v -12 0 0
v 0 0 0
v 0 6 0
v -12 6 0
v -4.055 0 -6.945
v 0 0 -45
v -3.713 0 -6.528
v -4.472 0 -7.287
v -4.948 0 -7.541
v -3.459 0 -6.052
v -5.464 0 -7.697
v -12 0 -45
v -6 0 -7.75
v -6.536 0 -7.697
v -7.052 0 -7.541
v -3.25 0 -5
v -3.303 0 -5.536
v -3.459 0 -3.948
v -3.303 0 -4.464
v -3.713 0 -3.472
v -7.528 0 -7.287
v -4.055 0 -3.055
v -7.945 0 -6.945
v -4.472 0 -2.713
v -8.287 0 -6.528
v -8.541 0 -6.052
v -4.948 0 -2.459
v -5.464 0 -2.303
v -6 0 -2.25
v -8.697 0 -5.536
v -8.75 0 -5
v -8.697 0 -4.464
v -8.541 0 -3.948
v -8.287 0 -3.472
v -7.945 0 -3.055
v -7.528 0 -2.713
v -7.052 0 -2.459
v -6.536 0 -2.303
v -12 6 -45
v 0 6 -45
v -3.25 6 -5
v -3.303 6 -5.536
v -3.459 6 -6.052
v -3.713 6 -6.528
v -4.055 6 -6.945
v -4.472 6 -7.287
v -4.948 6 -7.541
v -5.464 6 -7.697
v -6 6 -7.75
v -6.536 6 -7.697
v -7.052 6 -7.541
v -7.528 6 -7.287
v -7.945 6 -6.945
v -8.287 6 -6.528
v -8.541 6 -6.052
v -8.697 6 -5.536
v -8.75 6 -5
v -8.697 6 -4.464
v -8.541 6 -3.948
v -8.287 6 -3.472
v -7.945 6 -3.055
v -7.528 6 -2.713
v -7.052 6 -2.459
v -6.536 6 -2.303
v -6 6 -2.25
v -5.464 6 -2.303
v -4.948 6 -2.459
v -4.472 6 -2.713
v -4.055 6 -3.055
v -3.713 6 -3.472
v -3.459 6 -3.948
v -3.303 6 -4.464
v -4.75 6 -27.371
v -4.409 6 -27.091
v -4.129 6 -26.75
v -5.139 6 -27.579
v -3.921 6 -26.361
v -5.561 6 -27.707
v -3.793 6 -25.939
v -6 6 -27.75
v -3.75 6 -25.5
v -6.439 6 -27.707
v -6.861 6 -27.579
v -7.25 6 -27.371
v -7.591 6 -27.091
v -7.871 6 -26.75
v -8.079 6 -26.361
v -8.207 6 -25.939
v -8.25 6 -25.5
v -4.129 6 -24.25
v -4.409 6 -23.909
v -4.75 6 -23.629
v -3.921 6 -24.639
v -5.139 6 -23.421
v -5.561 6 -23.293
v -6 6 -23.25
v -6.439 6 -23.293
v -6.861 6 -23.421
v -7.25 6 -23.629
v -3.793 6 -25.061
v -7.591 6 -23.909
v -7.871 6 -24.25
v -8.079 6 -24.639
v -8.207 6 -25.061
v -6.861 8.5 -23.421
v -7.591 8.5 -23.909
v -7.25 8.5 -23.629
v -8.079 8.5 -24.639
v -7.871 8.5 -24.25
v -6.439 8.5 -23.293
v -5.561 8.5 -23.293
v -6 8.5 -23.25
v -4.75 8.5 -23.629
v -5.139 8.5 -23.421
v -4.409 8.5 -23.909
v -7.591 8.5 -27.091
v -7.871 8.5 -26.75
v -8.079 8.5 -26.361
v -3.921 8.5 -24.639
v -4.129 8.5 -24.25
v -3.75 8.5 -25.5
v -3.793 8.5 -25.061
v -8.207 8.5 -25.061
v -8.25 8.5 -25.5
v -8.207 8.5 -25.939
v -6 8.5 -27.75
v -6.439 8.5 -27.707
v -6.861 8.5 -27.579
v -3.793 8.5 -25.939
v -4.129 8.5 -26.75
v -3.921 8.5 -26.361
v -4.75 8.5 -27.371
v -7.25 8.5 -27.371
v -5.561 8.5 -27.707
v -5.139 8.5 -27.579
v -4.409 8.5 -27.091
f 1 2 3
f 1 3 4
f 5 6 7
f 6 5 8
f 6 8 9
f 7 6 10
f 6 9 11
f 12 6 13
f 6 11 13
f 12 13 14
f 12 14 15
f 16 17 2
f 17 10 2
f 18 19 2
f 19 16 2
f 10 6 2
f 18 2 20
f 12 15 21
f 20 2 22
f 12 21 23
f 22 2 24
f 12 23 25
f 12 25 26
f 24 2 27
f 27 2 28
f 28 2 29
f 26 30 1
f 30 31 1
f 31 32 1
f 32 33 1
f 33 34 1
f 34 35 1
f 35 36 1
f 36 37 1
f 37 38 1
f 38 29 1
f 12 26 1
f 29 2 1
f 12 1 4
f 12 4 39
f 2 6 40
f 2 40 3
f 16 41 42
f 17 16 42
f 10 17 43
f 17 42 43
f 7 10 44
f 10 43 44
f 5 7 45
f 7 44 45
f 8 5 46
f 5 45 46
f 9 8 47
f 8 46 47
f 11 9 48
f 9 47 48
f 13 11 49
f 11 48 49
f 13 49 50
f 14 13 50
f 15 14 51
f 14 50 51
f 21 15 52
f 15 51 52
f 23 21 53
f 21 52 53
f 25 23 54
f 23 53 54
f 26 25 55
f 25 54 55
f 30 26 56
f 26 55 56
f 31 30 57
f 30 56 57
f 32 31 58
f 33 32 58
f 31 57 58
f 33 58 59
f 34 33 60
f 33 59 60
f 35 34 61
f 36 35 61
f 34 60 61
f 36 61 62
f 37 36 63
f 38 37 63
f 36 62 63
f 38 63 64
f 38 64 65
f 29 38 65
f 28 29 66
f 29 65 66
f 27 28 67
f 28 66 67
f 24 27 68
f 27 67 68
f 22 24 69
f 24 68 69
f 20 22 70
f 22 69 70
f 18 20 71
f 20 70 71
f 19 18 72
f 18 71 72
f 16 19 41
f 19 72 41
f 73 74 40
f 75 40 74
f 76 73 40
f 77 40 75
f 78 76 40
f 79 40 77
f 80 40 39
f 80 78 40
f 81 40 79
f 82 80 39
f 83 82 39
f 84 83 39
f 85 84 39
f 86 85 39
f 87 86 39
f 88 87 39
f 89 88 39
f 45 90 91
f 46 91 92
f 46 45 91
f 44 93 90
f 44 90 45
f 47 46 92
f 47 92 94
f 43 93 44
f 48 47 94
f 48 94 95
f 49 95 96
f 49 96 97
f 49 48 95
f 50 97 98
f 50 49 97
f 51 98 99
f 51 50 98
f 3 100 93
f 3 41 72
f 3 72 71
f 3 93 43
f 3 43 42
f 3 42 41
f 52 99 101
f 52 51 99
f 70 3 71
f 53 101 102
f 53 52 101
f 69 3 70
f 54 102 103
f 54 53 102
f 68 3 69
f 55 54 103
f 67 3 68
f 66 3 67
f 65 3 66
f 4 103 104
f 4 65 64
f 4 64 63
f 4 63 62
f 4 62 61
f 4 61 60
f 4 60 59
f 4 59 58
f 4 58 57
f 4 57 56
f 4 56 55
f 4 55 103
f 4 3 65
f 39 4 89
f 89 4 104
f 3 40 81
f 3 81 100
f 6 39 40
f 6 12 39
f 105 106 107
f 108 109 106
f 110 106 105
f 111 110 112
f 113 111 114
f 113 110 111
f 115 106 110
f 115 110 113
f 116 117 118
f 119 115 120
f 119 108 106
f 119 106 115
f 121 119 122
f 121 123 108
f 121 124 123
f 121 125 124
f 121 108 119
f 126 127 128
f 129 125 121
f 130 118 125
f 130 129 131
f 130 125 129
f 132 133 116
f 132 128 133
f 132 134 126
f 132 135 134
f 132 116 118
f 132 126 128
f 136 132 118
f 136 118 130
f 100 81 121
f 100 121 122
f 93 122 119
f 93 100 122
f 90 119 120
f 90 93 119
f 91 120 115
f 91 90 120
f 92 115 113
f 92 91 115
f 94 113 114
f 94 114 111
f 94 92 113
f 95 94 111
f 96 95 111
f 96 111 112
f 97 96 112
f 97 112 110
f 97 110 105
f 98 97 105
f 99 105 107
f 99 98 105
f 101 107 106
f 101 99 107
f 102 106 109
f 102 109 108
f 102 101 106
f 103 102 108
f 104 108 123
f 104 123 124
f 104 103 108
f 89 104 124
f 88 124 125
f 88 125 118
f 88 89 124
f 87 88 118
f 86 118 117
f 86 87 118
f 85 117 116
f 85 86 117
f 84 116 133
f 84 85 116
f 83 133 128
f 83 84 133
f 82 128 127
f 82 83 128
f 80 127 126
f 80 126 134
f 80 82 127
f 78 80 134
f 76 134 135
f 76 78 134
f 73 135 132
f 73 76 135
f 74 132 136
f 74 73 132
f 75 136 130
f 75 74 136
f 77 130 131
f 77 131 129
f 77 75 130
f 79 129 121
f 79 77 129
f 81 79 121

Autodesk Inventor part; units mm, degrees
ref_plane "YZ Plane" through (0, 0, 0) normal (1, 0, 0) x (0, 1, 0)
ref_plane "XZ Plane" through (0, 0, 0) normal (0, 1, 0) x (-1, 0, 0)
ref_plane "XY Plane" through (0, 0, 0) normal (0, 0, 1) x (1, 0, 0)
sketch "Sketch1" plane through (0, 0, 0) normal (0, 1, 0) x (-1, 0, 0)
  line L0 (0, 0) -> (12, 0)
  line L1 (12, 0) -> (12, -45)
  line L2 (12, -45) -> (0, -45)
  line L3 (0, -45) -> (0, 0)
  dimension "d0" = 12
  dimension "d1" = 45
extrude "Extrusion1" add sketch "Sketch1" along normal blind 6
sketch "Sketch2" plane through (0, 6, 0) normal (0, 1, 0) x (1, 0, 0)
  line L0 (-12, 0) -> (0, 0) projected
  line L1 (-6, 0) -> (-6, 5)
  circle A0 centre (-6, 5) radius 2.75
  dimension "d4" = 5
  dimension "d5" = 5.5
extrude "Extrusion2" cut sketch "Sketch2" against normal blind 6
sketch "Sketch3" plane through (0, 6, 0) normal (0, 1, 0) x (1, 0, 0)
  circle A0 centre (-6, 5) radius 2.75 projected
  line L0 (-6, 5) -> (-6, 25.5)
  circle A1 centre (-6, 25.5) radius 2.25
  point P0 (0, 0)
  dimension "d8" = 20.5
  dimension "d9" = 4.5
extrude "Extrusion3" add sketch "Sketch3" along normal blind 2.5 contours A1
properties part number "limit_switch_upper_mount"
